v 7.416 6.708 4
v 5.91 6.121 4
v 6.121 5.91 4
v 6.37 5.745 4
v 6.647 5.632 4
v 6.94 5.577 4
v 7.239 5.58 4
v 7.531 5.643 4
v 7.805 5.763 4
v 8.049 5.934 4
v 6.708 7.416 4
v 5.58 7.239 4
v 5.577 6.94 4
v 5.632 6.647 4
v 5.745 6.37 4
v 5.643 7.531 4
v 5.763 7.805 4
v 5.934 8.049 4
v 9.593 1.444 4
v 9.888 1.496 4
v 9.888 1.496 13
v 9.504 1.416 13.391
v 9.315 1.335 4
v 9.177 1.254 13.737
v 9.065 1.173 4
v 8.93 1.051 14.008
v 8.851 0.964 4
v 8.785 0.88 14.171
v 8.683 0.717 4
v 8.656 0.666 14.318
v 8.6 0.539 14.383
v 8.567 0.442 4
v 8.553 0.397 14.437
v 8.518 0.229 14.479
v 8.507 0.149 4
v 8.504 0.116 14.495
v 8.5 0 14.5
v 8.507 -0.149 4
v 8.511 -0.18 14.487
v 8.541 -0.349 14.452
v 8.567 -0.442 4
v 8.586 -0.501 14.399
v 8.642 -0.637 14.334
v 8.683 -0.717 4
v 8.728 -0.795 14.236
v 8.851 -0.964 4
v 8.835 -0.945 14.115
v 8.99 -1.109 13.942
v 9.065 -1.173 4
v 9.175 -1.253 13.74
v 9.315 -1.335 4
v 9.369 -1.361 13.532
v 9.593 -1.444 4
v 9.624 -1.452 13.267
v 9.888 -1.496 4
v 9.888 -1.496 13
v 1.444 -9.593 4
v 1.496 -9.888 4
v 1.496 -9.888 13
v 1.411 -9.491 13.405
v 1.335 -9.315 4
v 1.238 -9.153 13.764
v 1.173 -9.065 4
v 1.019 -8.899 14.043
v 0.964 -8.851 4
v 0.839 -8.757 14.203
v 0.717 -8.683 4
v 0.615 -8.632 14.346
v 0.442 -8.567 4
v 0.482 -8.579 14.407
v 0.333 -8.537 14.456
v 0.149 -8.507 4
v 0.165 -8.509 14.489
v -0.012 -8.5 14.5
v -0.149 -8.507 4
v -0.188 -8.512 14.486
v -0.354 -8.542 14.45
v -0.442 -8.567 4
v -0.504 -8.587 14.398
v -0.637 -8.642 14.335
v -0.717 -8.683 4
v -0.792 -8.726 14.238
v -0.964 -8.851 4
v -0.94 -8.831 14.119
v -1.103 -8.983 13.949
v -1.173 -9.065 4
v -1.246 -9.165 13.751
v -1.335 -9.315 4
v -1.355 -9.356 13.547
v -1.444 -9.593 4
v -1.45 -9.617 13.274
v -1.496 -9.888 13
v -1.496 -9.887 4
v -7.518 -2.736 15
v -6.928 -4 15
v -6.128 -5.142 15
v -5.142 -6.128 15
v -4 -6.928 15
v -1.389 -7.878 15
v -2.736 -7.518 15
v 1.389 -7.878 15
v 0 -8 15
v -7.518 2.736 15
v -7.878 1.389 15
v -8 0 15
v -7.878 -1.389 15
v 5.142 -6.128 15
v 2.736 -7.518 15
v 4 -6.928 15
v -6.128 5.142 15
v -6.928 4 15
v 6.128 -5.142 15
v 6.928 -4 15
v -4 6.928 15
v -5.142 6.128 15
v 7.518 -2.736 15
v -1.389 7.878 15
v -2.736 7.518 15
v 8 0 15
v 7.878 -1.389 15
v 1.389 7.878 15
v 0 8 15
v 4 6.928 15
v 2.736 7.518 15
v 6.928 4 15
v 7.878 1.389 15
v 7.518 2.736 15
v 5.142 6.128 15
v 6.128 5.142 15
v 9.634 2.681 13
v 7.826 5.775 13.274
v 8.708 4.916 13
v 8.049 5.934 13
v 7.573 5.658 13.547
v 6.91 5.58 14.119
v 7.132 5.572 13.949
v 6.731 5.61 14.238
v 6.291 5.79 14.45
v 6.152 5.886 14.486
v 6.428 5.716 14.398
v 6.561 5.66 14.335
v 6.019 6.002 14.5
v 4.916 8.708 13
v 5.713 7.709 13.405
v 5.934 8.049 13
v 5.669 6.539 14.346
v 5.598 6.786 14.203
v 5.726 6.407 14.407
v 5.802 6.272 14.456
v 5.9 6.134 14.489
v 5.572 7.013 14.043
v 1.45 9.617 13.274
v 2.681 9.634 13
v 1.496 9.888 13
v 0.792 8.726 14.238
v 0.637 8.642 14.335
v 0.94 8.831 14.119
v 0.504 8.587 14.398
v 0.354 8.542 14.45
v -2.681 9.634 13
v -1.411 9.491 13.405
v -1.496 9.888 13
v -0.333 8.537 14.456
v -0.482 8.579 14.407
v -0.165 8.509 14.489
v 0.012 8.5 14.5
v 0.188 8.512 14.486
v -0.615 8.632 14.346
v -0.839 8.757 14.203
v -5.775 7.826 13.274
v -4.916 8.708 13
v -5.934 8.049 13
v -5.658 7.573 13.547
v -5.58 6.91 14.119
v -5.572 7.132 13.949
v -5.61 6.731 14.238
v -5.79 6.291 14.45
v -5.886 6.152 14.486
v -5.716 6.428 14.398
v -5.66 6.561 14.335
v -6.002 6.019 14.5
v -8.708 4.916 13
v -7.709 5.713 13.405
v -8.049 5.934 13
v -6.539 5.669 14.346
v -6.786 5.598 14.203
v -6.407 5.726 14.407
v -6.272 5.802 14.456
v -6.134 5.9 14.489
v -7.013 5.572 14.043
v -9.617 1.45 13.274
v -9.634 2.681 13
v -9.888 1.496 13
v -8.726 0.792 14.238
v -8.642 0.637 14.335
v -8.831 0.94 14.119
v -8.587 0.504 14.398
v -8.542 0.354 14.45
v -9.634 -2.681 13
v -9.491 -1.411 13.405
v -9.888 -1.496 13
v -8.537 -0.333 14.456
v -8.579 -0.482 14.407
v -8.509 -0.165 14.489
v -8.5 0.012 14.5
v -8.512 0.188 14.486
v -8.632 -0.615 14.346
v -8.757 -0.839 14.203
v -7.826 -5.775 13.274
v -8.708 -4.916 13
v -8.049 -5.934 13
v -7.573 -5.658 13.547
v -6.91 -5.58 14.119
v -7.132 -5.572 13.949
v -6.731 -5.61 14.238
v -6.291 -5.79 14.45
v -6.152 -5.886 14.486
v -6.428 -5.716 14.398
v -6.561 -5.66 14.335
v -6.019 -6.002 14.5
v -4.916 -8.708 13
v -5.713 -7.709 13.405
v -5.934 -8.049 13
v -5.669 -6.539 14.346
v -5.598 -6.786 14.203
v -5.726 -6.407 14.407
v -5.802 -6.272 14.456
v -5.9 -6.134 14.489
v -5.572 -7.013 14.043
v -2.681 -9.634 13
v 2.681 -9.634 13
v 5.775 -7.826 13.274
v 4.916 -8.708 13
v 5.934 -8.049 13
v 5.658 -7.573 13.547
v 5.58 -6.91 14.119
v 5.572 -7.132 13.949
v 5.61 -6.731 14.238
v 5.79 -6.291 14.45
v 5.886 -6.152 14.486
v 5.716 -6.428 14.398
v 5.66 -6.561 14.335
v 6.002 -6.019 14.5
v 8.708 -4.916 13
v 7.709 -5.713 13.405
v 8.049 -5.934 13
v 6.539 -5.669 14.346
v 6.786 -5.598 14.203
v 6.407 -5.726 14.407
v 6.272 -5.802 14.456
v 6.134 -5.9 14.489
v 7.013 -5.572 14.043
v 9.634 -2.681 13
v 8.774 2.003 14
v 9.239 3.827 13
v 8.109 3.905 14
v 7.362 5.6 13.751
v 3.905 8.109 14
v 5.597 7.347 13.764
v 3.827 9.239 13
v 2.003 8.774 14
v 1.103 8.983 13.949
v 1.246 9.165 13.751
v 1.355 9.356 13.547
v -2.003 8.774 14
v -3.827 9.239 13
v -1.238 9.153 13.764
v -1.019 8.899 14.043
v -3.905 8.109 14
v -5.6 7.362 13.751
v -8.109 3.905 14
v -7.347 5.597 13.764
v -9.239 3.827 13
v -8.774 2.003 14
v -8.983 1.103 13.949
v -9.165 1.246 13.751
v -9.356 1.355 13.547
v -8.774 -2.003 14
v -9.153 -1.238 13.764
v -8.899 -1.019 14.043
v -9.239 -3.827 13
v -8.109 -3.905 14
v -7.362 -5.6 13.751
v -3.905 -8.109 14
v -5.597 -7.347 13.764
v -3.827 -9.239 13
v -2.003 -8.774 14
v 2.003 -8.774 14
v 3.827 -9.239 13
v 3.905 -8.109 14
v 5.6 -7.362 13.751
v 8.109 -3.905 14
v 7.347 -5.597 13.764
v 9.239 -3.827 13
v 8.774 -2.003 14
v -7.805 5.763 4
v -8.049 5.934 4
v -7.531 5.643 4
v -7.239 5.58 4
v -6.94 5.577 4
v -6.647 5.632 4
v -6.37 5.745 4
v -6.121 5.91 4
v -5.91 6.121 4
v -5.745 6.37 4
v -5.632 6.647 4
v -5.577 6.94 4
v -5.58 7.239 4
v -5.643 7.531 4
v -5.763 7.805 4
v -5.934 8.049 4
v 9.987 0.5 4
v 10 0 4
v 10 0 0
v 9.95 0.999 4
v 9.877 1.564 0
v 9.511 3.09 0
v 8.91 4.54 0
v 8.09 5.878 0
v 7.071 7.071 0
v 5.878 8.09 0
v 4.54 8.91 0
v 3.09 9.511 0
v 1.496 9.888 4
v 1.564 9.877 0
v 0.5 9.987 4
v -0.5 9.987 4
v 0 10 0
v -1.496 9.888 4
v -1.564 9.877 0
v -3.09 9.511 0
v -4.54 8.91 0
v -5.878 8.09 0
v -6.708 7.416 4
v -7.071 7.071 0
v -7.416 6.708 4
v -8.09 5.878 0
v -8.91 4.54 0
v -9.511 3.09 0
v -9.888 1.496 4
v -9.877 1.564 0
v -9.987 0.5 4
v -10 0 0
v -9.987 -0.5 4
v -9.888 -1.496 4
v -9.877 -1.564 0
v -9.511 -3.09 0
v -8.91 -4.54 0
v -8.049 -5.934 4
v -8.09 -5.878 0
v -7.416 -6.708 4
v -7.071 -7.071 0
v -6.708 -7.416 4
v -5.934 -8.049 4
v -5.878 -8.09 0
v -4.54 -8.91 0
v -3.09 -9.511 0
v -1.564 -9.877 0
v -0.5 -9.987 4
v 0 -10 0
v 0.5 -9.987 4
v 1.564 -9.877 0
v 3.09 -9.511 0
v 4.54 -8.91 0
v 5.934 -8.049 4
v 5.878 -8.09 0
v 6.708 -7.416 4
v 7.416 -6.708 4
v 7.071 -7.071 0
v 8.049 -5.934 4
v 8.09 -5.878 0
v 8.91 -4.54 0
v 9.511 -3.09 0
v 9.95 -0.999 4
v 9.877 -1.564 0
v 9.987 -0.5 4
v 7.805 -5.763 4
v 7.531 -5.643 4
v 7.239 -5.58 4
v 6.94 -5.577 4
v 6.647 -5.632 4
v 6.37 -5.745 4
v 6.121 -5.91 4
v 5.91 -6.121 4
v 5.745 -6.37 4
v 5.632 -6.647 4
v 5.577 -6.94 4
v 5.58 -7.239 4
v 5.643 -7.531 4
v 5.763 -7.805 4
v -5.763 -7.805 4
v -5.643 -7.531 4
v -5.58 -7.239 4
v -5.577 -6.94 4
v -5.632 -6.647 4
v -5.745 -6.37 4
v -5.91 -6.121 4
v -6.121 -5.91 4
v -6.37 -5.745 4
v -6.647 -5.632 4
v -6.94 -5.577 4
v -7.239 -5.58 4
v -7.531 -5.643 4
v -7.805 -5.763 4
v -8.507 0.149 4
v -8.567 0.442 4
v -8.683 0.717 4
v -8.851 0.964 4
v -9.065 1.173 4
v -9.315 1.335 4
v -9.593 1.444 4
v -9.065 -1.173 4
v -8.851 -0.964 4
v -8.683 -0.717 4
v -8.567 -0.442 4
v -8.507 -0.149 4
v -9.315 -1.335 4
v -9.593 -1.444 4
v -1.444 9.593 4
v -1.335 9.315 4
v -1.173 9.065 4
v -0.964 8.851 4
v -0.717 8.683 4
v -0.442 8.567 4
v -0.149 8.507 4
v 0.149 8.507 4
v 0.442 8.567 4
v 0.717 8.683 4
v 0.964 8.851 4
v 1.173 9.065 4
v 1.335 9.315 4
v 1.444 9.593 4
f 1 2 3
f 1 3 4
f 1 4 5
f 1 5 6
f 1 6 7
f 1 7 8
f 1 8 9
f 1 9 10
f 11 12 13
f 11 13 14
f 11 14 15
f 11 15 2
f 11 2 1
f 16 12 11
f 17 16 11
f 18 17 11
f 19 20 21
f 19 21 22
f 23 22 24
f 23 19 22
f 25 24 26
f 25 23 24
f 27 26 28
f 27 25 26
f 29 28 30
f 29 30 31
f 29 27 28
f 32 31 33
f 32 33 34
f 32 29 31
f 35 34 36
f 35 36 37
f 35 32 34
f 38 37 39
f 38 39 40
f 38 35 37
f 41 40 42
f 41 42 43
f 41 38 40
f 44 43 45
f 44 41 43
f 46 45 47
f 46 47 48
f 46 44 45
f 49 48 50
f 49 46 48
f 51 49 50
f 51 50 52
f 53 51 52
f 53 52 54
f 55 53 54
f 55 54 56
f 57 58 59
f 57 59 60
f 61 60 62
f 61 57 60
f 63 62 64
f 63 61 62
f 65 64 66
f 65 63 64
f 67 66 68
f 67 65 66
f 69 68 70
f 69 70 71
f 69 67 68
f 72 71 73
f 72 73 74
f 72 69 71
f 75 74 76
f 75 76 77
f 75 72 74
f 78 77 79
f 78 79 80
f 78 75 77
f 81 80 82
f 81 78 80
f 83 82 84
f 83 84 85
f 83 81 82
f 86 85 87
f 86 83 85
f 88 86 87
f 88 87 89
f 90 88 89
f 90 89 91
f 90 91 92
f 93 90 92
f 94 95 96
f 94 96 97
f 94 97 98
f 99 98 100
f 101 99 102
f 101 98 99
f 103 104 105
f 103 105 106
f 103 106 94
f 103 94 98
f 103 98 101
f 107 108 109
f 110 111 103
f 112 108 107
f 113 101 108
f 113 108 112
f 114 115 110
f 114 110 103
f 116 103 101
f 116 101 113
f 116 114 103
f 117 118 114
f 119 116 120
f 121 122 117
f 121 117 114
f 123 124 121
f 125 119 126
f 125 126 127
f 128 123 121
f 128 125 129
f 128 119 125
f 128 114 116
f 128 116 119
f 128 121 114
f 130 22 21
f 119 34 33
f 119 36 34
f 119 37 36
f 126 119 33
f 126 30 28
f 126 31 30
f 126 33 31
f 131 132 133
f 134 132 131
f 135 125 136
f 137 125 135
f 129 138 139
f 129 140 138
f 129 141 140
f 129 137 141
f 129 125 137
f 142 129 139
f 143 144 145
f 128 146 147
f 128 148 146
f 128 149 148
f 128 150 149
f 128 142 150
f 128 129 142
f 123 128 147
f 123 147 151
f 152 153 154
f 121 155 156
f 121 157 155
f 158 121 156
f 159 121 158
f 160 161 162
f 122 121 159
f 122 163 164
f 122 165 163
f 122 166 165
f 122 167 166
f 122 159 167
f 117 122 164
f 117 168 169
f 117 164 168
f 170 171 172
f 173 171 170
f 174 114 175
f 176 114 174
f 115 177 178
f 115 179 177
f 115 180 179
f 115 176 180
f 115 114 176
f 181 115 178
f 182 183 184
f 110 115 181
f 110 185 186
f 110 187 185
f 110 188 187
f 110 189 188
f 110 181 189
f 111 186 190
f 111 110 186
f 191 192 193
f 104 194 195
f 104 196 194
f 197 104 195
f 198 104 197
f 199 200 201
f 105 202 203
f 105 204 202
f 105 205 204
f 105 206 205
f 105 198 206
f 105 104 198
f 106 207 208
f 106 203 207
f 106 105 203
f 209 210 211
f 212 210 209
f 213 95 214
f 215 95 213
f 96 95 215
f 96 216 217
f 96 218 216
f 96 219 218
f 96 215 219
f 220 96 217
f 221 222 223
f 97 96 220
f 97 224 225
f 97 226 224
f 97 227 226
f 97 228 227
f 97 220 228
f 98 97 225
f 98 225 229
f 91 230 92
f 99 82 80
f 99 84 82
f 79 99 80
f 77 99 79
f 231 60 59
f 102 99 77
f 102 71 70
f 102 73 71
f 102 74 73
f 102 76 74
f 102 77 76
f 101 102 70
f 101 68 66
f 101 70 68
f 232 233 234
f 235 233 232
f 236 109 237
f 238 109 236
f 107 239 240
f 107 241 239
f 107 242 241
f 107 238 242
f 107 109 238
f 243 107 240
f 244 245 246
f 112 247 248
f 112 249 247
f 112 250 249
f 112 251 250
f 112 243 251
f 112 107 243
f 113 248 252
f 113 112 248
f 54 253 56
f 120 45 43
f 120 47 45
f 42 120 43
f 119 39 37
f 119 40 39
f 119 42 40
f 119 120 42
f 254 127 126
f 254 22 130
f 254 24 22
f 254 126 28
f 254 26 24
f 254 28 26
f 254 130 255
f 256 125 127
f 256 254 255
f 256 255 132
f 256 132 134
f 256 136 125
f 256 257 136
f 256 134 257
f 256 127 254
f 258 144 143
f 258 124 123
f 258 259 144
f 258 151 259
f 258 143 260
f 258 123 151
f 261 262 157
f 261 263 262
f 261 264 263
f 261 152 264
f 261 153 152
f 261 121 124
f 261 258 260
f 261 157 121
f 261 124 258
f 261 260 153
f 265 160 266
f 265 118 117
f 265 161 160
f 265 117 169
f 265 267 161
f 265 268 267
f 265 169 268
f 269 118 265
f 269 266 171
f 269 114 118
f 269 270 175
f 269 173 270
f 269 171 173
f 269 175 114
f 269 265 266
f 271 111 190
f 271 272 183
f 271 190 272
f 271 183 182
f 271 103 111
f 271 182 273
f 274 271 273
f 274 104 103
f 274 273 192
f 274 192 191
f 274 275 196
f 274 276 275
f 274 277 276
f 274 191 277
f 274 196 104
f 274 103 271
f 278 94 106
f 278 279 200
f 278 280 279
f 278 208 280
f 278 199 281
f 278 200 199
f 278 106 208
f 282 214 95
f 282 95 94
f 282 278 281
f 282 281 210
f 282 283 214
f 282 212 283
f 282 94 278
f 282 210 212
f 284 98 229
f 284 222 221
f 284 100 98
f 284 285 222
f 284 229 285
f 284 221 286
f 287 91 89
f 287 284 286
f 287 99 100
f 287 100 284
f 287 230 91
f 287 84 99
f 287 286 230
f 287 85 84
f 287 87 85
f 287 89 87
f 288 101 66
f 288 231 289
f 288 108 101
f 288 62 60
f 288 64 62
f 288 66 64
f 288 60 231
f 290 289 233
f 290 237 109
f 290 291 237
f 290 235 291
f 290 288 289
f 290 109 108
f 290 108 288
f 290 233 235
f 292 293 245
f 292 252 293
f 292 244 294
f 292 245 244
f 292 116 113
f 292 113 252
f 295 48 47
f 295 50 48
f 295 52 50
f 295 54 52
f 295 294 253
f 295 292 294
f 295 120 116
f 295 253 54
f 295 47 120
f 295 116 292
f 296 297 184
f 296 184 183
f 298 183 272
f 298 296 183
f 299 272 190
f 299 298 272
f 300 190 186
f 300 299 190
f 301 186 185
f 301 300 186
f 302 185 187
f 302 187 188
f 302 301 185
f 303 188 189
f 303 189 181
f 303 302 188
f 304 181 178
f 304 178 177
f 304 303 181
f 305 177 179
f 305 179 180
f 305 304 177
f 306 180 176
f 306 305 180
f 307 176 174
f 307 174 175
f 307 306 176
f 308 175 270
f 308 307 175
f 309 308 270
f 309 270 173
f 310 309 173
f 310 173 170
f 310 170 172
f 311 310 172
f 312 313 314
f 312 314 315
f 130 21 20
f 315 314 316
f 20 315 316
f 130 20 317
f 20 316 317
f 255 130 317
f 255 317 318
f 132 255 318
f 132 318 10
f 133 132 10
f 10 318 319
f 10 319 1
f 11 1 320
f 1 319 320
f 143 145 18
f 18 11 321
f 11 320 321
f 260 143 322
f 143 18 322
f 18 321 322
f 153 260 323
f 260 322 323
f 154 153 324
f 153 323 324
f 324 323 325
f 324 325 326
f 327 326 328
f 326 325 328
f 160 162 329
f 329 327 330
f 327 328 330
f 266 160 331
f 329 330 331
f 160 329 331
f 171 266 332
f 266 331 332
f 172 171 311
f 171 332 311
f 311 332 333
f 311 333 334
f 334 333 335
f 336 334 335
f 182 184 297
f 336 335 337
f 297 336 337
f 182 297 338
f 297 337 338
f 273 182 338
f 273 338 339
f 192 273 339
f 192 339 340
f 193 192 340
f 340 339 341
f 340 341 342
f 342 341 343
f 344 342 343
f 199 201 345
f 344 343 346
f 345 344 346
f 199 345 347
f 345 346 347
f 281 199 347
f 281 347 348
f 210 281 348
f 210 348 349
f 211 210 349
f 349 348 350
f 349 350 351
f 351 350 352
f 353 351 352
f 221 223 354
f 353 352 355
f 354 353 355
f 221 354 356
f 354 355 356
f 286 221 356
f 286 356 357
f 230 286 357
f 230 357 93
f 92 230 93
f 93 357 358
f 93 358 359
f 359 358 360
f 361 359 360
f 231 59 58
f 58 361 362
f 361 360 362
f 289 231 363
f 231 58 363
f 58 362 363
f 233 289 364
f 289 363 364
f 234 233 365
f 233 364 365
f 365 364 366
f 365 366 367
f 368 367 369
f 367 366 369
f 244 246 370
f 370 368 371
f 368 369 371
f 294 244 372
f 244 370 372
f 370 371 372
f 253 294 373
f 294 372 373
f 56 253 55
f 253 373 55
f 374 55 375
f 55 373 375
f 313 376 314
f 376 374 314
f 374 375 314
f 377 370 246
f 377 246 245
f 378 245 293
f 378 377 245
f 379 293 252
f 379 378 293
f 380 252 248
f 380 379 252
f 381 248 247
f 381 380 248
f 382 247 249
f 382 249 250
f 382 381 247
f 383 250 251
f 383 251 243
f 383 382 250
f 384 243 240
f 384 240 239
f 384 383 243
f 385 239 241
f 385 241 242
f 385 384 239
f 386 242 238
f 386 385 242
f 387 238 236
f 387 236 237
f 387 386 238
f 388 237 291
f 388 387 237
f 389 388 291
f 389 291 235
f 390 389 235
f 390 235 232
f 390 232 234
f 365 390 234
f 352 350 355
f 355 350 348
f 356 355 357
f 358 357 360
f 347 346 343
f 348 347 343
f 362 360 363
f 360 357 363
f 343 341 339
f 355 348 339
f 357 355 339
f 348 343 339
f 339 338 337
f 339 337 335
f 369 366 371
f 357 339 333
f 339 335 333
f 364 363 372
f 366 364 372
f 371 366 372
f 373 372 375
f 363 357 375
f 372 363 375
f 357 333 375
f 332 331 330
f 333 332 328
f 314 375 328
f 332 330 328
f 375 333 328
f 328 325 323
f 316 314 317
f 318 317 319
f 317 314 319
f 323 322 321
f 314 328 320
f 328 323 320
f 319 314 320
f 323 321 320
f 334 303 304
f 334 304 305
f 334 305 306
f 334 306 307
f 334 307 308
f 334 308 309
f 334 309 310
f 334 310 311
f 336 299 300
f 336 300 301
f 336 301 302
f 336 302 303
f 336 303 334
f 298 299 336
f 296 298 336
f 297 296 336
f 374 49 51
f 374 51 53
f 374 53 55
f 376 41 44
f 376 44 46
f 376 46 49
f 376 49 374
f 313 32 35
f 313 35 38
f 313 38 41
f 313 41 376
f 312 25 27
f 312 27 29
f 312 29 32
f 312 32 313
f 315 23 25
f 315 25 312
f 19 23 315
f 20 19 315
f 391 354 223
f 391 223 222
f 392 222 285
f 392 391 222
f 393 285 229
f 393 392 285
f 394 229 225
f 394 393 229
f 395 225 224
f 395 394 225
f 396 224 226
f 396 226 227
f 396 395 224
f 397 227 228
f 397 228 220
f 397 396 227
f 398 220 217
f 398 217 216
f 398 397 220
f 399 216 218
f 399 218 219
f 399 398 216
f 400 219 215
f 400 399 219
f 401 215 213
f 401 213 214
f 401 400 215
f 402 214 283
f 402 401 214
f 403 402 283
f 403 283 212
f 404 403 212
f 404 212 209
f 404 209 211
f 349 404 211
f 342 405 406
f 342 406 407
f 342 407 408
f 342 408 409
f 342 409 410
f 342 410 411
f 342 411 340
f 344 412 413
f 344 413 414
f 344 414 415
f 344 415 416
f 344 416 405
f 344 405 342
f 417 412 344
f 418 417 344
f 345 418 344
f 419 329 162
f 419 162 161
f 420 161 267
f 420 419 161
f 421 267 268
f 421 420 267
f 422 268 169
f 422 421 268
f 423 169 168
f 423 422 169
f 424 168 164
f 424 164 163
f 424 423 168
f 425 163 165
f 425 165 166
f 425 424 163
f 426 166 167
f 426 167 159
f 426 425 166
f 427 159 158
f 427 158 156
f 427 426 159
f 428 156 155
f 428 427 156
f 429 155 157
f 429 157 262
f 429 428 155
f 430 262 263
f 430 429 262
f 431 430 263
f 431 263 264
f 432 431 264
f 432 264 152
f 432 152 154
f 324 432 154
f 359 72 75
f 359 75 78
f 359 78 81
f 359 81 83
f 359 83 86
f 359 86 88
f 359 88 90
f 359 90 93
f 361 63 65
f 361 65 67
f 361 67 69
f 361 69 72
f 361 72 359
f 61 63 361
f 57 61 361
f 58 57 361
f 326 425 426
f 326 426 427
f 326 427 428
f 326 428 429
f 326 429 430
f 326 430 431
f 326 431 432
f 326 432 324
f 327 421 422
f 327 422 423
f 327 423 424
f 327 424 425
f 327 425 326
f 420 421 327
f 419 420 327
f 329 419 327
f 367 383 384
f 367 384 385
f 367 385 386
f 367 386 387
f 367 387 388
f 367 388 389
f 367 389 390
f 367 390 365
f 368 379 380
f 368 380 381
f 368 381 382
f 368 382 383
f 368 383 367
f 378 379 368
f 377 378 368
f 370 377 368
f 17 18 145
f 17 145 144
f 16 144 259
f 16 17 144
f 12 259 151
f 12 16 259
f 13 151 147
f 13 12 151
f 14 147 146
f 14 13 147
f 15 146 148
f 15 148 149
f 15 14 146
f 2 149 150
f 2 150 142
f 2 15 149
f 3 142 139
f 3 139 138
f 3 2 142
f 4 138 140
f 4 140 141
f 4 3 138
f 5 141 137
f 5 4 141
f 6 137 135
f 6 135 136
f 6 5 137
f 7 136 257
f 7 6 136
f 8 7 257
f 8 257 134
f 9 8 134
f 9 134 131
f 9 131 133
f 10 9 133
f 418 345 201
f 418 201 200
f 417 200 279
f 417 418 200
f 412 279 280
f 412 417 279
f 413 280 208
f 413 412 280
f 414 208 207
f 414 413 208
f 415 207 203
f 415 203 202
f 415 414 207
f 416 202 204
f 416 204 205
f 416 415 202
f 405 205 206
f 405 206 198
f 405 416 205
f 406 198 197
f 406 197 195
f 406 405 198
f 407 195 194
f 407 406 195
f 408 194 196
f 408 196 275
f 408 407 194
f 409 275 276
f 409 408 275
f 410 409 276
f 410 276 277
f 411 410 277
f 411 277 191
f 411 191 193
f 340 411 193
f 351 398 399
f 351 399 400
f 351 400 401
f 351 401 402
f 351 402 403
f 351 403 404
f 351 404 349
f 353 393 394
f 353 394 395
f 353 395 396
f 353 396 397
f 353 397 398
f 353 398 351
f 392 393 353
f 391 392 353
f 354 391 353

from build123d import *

# Parameters (mm, degrees)
CYLINDER001_R     = 1.5
CYLINDER001_DEPTH = 20
ARRAY_COUNT       = 8
CYLINDER_R        = 10
CYLINDER_DEPTH    = 15
CHAMFER_SIZE      = 2


with BuildPart() as array:
    # Cylinder001 → Cylinder001 (new body)
    with BuildSketch(Plane(origin=(10, 0, 0), x_dir=(1, 0, 0), z_dir=(0, 0, 1))):
        Circle(CYLINDER001_R)
    extrude(amount=CYLINDER001_DEPTH)

    # Array: Array ×8 about axis
    array_axis = Axis((0, 0, 0), (0, 0, 1))


with BuildPart() as array_1:
    add(array.part)
    for i in range(1, ARRAY_COUNT):
        add(array.part.rotate(array_axis, i * 360 / ARRAY_COUNT))


with BuildPart() as array_2:
    # Array placement: moved
    add(array_1.part.moved(Location((0, 0, 4))))


with BuildPart() as cut:
    # Cylinder → Cylinder (new body)
    with BuildSketch(Plane.XY):
        Circle(CYLINDER_R)
    extrude(amount=CYLINDER_DEPTH)

    # Chamfer
    chamfer_edges = [cut.edges().sort_by_distance(p)[0] for p in [
        (-10, 0, 15),
    ]]
    chamfer(chamfer_edges, length=CHAMFER_SIZE)

    # Cut: cut Array
    add(array_2.part, mode=Mode.SUBTRACT)


solid = cut.part
